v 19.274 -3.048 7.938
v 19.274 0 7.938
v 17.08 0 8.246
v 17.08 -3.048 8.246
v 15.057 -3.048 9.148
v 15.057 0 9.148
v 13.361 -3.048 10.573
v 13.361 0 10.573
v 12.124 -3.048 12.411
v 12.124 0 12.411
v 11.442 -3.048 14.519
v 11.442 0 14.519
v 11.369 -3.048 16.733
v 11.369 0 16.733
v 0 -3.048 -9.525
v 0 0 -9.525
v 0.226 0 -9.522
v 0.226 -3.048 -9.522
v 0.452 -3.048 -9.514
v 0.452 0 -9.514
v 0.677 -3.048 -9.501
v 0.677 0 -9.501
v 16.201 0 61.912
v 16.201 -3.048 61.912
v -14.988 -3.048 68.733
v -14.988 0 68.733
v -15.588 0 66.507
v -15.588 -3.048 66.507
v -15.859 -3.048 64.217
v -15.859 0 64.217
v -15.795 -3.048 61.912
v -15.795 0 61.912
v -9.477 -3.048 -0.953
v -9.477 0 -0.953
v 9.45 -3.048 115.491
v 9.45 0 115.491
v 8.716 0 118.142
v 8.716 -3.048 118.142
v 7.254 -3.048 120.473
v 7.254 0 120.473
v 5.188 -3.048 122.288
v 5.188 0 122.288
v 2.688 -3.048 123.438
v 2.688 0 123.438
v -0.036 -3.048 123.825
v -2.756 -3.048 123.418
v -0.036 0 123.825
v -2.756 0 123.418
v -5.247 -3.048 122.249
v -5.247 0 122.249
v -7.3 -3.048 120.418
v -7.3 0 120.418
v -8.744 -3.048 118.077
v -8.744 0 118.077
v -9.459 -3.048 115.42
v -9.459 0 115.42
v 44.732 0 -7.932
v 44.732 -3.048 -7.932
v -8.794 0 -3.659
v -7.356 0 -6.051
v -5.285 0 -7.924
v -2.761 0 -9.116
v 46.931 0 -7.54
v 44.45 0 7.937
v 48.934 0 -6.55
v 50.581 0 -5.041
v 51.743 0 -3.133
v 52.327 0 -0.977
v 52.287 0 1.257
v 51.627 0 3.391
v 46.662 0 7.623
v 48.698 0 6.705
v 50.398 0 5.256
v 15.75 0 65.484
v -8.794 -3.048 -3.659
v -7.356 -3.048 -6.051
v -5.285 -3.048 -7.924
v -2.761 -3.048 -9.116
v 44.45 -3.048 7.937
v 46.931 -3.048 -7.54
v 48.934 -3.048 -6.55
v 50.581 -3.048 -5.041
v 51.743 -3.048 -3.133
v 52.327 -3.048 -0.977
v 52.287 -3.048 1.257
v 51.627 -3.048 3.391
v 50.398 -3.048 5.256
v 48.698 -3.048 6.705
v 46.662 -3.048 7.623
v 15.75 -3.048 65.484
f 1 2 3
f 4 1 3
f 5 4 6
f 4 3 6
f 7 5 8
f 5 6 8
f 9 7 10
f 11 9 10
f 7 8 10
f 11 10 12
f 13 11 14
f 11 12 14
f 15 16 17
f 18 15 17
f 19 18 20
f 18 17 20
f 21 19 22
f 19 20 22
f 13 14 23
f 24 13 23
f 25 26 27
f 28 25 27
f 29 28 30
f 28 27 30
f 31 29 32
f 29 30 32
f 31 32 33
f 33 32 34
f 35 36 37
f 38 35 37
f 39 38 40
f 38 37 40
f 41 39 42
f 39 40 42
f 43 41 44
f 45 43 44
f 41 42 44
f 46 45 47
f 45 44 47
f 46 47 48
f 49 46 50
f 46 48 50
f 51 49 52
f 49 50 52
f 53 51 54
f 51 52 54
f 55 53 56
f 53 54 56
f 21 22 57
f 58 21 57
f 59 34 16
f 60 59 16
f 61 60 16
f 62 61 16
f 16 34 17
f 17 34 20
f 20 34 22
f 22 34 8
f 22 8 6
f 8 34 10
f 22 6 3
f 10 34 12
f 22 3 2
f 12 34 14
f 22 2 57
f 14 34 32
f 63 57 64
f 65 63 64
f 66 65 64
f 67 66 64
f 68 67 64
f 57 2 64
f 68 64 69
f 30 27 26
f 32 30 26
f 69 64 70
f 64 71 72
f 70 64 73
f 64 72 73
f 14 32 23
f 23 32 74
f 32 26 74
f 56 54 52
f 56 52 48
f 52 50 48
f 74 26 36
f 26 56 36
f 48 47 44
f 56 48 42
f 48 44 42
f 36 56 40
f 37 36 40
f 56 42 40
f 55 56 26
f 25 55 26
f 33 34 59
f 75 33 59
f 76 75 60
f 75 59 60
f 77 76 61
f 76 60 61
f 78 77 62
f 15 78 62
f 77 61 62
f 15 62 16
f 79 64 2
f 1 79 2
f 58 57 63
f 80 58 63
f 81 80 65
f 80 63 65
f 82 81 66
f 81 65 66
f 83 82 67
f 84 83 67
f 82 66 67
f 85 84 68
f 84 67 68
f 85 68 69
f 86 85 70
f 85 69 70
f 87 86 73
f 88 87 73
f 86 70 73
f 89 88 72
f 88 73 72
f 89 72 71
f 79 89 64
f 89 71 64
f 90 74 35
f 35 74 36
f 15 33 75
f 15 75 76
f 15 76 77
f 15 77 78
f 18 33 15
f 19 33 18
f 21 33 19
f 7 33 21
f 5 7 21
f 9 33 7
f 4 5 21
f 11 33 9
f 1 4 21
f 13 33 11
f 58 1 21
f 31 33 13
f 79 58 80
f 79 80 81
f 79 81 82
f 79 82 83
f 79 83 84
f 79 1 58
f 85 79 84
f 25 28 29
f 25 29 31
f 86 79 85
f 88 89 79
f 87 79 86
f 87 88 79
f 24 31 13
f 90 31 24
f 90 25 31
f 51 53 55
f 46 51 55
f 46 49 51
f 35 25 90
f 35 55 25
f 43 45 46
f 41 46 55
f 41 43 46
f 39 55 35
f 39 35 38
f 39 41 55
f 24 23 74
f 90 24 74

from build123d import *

# Parameters (mm, degrees)
F1_DEPTH = 3.048


with BuildPart() as f1:
    # F0 (on Front) → F1 (new body)
    with BuildSketch(Plane.XZ):
        with BuildLine():
            Line((9.525, 0), (0, 0))
            Line((0, 0), (0, 9.525))
            ThreePointArc((0, 9.525), (-7.063929059, 6.3895642457), (-9.4772553384, -0.9525))
            ThreePointArc((-9.4772553384, -0.9525), (-6.3895642457, -7.063929059), (0, -9.525))
            Line((0, -9.525), (0.6773435479, -9.500885786))
            ThreePointArc((0.6773435479, -9.500885786), (6.9705567315, -6.4912990883), (9.525, 0))
        make_face()
        with BuildLine():
            ThreePointArc((-9.4772553384, -0.9525), (-7.063929059, 6.3895642457), (0, 9.525))
            Line((0, 9.525), (0, 47.625))
            ThreePointArc((0, 47.625), (-10.6492737428, 51.7267849017), (-15.7954255641, 61.9125))
            Line((-15.7954255641, 61.9125), (-9.4772553384, -0.9525))
        make_face()
        with BuildLine():
            Line((0, 47.625), (0, 9.525))
            ThreePointArc((0, 9.525), (6.7351920908, 6.7351920908), (9.525, 0))
            Line((9.525, 0), (36.5125, 0))
            ThreePointArc((36.5125, 0), (38.8373399243, 5.6126600757), (44.45, 7.9375))
            Line((44.45, 7.9375), (19.2739472197, 7.9375))
            ThreePointArc((19.2739472197, 7.9375), (13.3609598068, 10.5733552714), (11.3688244585, 16.7331076944))
            Line((11.3688244585, 16.7331076944), (16.2005022244, 61.9125))
            Line((16.2005022244, 61.9125), (15.7504882915, 65.4843748585))
            ThreePointArc((15.7504882915, 65.4843748585), (15.8438414948, 64.4941386655), (15.875, 63.5))
            ThreePointArc((15.875, 63.5), (11.2253201513, 52.2746798487), (0, 47.625))
        make_face()
        with BuildLine():
            Line((36.5125, 0), (9.525, 0))
            ThreePointArc((9.525, 0), (6.9705567315, -6.4912990883), (0.6773435479, -9.500885786))
            Line((0.6773435479, -9.500885786), (44.7324052746, -7.9324746146))
            ThreePointArc((44.7324052746, -7.9324746146), (38.9380895153, -5.7116327839), (36.5125, 0))
        make_face()
        with BuildLine():
            ThreePointArc((-15.7954255641, 61.9125), (-10.6492737428, 51.7267849017), (0, 47.625))
            Line((0, 47.625), (0, 79.375))
            ThreePointArc((0, 79.375), (-9.1908363712, 76.4438847259), (-14.9877324754, 68.7329246359))
            Line((-14.9877324754, 68.7329246359), (-15.7954255641, 61.9125))
        make_face()
        with BuildLine():
            Line((0, 79.375), (0, 47.625))
            ThreePointArc((0, 47.625), (11.2253201513, 52.2746798487), (15.875, 63.5))
            ThreePointArc((15.875, 63.5), (15.8438414948, 64.4941386655), (15.7504882915, 65.4843748585))
            ThreePointArc((15.7504882915, 65.4843748585), (10.5003255693, 75.4062499528), (0, 79.375))
        make_face()
        with BuildLine():
            ThreePointArc((44.45, 7.9375), (38.8373399243, 5.6126600757), (36.5125, 0))
            ThreePointArc((36.5125, 0), (38.9380895153, -5.7116327839), (44.7324052746, -7.9324746146))
            ThreePointArc((44.7324052746, -7.9324746146), (50.1616327839, -5.5119104847), (52.3875, 0))
            ThreePointArc((52.3875, 0), (50.0626600757, 5.6126600757), (44.45, 7.9375))
        make_face()
        with BuildLine():
            ThreePointArc((0, -9.525), (0.3388863295, -9.5189695375), (0.6773435479, -9.500885786))
            Line((0.6773435479, -9.500885786), (0, -9.525))
        make_face()
        with BuildLine():
            ThreePointArc((-14.9877324754, 68.7329246359), (-9.1908363712, 76.4438847259), (0, 79.375))
            Line((0, 79.375), (0, 104.775))
            ThreePointArc((0, 104.775), (-7.1202192788, 107.9732233782), (-9.4589053806, 115.4201490977))
            Line((-9.4589053806, 115.4201490977), (-14.9877324754, 68.7329246359))
        make_face()
        with BuildLine():
            Line((0, 104.775), (0, 79.375))
            ThreePointArc((0, 79.375), (10.5003255693, 75.4062499528), (15.7504882915, 65.4843748585))
            Line((15.7504882915, 65.4843748585), (9.4502929642, 115.490625))
            ThreePointArc((9.4502929642, 115.490625), (9.5063048942, 114.896483242), (9.525, 114.3))
            ThreePointArc((9.525, 114.3), (6.7351920908, 107.5648079092), (0, 104.775))
        make_face()
        with BuildLine():
            ThreePointArc((-14.9877324754, 68.7329246359), (-15.764842301, 65.3669151629), (-15.7954255641, 61.9125))
            Line((-15.7954255641, 61.9125), (-14.9877324754, 68.7329246359))
        make_face()
        with BuildLine():
            ThreePointArc((-9.4589053806, 115.4201490977), (-7.1202192788, 107.9732233782), (0, 104.775))
            ThreePointArc((0, 104.775), (6.7351920908, 107.5648079092), (9.525, 114.3))
            ThreePointArc((9.525, 114.3), (9.5063048942, 114.896483242), (9.4502929642, 115.490625))
            ThreePointArc((9.4502929642, 115.490625), (-0.0355000934, 123.8249338446), (-9.4589053806, 115.4201490977))
        make_face()
        with BuildLine():
            Line((0, 9.525), (0, 0))
            Line((0, 0), (9.525, 0))
            ThreePointArc((9.525, 0), (6.7351920908, 6.7351920908), (0, 9.525))
        make_face()
    extrude(amount=F1_DEPTH)


solid = f1.part
